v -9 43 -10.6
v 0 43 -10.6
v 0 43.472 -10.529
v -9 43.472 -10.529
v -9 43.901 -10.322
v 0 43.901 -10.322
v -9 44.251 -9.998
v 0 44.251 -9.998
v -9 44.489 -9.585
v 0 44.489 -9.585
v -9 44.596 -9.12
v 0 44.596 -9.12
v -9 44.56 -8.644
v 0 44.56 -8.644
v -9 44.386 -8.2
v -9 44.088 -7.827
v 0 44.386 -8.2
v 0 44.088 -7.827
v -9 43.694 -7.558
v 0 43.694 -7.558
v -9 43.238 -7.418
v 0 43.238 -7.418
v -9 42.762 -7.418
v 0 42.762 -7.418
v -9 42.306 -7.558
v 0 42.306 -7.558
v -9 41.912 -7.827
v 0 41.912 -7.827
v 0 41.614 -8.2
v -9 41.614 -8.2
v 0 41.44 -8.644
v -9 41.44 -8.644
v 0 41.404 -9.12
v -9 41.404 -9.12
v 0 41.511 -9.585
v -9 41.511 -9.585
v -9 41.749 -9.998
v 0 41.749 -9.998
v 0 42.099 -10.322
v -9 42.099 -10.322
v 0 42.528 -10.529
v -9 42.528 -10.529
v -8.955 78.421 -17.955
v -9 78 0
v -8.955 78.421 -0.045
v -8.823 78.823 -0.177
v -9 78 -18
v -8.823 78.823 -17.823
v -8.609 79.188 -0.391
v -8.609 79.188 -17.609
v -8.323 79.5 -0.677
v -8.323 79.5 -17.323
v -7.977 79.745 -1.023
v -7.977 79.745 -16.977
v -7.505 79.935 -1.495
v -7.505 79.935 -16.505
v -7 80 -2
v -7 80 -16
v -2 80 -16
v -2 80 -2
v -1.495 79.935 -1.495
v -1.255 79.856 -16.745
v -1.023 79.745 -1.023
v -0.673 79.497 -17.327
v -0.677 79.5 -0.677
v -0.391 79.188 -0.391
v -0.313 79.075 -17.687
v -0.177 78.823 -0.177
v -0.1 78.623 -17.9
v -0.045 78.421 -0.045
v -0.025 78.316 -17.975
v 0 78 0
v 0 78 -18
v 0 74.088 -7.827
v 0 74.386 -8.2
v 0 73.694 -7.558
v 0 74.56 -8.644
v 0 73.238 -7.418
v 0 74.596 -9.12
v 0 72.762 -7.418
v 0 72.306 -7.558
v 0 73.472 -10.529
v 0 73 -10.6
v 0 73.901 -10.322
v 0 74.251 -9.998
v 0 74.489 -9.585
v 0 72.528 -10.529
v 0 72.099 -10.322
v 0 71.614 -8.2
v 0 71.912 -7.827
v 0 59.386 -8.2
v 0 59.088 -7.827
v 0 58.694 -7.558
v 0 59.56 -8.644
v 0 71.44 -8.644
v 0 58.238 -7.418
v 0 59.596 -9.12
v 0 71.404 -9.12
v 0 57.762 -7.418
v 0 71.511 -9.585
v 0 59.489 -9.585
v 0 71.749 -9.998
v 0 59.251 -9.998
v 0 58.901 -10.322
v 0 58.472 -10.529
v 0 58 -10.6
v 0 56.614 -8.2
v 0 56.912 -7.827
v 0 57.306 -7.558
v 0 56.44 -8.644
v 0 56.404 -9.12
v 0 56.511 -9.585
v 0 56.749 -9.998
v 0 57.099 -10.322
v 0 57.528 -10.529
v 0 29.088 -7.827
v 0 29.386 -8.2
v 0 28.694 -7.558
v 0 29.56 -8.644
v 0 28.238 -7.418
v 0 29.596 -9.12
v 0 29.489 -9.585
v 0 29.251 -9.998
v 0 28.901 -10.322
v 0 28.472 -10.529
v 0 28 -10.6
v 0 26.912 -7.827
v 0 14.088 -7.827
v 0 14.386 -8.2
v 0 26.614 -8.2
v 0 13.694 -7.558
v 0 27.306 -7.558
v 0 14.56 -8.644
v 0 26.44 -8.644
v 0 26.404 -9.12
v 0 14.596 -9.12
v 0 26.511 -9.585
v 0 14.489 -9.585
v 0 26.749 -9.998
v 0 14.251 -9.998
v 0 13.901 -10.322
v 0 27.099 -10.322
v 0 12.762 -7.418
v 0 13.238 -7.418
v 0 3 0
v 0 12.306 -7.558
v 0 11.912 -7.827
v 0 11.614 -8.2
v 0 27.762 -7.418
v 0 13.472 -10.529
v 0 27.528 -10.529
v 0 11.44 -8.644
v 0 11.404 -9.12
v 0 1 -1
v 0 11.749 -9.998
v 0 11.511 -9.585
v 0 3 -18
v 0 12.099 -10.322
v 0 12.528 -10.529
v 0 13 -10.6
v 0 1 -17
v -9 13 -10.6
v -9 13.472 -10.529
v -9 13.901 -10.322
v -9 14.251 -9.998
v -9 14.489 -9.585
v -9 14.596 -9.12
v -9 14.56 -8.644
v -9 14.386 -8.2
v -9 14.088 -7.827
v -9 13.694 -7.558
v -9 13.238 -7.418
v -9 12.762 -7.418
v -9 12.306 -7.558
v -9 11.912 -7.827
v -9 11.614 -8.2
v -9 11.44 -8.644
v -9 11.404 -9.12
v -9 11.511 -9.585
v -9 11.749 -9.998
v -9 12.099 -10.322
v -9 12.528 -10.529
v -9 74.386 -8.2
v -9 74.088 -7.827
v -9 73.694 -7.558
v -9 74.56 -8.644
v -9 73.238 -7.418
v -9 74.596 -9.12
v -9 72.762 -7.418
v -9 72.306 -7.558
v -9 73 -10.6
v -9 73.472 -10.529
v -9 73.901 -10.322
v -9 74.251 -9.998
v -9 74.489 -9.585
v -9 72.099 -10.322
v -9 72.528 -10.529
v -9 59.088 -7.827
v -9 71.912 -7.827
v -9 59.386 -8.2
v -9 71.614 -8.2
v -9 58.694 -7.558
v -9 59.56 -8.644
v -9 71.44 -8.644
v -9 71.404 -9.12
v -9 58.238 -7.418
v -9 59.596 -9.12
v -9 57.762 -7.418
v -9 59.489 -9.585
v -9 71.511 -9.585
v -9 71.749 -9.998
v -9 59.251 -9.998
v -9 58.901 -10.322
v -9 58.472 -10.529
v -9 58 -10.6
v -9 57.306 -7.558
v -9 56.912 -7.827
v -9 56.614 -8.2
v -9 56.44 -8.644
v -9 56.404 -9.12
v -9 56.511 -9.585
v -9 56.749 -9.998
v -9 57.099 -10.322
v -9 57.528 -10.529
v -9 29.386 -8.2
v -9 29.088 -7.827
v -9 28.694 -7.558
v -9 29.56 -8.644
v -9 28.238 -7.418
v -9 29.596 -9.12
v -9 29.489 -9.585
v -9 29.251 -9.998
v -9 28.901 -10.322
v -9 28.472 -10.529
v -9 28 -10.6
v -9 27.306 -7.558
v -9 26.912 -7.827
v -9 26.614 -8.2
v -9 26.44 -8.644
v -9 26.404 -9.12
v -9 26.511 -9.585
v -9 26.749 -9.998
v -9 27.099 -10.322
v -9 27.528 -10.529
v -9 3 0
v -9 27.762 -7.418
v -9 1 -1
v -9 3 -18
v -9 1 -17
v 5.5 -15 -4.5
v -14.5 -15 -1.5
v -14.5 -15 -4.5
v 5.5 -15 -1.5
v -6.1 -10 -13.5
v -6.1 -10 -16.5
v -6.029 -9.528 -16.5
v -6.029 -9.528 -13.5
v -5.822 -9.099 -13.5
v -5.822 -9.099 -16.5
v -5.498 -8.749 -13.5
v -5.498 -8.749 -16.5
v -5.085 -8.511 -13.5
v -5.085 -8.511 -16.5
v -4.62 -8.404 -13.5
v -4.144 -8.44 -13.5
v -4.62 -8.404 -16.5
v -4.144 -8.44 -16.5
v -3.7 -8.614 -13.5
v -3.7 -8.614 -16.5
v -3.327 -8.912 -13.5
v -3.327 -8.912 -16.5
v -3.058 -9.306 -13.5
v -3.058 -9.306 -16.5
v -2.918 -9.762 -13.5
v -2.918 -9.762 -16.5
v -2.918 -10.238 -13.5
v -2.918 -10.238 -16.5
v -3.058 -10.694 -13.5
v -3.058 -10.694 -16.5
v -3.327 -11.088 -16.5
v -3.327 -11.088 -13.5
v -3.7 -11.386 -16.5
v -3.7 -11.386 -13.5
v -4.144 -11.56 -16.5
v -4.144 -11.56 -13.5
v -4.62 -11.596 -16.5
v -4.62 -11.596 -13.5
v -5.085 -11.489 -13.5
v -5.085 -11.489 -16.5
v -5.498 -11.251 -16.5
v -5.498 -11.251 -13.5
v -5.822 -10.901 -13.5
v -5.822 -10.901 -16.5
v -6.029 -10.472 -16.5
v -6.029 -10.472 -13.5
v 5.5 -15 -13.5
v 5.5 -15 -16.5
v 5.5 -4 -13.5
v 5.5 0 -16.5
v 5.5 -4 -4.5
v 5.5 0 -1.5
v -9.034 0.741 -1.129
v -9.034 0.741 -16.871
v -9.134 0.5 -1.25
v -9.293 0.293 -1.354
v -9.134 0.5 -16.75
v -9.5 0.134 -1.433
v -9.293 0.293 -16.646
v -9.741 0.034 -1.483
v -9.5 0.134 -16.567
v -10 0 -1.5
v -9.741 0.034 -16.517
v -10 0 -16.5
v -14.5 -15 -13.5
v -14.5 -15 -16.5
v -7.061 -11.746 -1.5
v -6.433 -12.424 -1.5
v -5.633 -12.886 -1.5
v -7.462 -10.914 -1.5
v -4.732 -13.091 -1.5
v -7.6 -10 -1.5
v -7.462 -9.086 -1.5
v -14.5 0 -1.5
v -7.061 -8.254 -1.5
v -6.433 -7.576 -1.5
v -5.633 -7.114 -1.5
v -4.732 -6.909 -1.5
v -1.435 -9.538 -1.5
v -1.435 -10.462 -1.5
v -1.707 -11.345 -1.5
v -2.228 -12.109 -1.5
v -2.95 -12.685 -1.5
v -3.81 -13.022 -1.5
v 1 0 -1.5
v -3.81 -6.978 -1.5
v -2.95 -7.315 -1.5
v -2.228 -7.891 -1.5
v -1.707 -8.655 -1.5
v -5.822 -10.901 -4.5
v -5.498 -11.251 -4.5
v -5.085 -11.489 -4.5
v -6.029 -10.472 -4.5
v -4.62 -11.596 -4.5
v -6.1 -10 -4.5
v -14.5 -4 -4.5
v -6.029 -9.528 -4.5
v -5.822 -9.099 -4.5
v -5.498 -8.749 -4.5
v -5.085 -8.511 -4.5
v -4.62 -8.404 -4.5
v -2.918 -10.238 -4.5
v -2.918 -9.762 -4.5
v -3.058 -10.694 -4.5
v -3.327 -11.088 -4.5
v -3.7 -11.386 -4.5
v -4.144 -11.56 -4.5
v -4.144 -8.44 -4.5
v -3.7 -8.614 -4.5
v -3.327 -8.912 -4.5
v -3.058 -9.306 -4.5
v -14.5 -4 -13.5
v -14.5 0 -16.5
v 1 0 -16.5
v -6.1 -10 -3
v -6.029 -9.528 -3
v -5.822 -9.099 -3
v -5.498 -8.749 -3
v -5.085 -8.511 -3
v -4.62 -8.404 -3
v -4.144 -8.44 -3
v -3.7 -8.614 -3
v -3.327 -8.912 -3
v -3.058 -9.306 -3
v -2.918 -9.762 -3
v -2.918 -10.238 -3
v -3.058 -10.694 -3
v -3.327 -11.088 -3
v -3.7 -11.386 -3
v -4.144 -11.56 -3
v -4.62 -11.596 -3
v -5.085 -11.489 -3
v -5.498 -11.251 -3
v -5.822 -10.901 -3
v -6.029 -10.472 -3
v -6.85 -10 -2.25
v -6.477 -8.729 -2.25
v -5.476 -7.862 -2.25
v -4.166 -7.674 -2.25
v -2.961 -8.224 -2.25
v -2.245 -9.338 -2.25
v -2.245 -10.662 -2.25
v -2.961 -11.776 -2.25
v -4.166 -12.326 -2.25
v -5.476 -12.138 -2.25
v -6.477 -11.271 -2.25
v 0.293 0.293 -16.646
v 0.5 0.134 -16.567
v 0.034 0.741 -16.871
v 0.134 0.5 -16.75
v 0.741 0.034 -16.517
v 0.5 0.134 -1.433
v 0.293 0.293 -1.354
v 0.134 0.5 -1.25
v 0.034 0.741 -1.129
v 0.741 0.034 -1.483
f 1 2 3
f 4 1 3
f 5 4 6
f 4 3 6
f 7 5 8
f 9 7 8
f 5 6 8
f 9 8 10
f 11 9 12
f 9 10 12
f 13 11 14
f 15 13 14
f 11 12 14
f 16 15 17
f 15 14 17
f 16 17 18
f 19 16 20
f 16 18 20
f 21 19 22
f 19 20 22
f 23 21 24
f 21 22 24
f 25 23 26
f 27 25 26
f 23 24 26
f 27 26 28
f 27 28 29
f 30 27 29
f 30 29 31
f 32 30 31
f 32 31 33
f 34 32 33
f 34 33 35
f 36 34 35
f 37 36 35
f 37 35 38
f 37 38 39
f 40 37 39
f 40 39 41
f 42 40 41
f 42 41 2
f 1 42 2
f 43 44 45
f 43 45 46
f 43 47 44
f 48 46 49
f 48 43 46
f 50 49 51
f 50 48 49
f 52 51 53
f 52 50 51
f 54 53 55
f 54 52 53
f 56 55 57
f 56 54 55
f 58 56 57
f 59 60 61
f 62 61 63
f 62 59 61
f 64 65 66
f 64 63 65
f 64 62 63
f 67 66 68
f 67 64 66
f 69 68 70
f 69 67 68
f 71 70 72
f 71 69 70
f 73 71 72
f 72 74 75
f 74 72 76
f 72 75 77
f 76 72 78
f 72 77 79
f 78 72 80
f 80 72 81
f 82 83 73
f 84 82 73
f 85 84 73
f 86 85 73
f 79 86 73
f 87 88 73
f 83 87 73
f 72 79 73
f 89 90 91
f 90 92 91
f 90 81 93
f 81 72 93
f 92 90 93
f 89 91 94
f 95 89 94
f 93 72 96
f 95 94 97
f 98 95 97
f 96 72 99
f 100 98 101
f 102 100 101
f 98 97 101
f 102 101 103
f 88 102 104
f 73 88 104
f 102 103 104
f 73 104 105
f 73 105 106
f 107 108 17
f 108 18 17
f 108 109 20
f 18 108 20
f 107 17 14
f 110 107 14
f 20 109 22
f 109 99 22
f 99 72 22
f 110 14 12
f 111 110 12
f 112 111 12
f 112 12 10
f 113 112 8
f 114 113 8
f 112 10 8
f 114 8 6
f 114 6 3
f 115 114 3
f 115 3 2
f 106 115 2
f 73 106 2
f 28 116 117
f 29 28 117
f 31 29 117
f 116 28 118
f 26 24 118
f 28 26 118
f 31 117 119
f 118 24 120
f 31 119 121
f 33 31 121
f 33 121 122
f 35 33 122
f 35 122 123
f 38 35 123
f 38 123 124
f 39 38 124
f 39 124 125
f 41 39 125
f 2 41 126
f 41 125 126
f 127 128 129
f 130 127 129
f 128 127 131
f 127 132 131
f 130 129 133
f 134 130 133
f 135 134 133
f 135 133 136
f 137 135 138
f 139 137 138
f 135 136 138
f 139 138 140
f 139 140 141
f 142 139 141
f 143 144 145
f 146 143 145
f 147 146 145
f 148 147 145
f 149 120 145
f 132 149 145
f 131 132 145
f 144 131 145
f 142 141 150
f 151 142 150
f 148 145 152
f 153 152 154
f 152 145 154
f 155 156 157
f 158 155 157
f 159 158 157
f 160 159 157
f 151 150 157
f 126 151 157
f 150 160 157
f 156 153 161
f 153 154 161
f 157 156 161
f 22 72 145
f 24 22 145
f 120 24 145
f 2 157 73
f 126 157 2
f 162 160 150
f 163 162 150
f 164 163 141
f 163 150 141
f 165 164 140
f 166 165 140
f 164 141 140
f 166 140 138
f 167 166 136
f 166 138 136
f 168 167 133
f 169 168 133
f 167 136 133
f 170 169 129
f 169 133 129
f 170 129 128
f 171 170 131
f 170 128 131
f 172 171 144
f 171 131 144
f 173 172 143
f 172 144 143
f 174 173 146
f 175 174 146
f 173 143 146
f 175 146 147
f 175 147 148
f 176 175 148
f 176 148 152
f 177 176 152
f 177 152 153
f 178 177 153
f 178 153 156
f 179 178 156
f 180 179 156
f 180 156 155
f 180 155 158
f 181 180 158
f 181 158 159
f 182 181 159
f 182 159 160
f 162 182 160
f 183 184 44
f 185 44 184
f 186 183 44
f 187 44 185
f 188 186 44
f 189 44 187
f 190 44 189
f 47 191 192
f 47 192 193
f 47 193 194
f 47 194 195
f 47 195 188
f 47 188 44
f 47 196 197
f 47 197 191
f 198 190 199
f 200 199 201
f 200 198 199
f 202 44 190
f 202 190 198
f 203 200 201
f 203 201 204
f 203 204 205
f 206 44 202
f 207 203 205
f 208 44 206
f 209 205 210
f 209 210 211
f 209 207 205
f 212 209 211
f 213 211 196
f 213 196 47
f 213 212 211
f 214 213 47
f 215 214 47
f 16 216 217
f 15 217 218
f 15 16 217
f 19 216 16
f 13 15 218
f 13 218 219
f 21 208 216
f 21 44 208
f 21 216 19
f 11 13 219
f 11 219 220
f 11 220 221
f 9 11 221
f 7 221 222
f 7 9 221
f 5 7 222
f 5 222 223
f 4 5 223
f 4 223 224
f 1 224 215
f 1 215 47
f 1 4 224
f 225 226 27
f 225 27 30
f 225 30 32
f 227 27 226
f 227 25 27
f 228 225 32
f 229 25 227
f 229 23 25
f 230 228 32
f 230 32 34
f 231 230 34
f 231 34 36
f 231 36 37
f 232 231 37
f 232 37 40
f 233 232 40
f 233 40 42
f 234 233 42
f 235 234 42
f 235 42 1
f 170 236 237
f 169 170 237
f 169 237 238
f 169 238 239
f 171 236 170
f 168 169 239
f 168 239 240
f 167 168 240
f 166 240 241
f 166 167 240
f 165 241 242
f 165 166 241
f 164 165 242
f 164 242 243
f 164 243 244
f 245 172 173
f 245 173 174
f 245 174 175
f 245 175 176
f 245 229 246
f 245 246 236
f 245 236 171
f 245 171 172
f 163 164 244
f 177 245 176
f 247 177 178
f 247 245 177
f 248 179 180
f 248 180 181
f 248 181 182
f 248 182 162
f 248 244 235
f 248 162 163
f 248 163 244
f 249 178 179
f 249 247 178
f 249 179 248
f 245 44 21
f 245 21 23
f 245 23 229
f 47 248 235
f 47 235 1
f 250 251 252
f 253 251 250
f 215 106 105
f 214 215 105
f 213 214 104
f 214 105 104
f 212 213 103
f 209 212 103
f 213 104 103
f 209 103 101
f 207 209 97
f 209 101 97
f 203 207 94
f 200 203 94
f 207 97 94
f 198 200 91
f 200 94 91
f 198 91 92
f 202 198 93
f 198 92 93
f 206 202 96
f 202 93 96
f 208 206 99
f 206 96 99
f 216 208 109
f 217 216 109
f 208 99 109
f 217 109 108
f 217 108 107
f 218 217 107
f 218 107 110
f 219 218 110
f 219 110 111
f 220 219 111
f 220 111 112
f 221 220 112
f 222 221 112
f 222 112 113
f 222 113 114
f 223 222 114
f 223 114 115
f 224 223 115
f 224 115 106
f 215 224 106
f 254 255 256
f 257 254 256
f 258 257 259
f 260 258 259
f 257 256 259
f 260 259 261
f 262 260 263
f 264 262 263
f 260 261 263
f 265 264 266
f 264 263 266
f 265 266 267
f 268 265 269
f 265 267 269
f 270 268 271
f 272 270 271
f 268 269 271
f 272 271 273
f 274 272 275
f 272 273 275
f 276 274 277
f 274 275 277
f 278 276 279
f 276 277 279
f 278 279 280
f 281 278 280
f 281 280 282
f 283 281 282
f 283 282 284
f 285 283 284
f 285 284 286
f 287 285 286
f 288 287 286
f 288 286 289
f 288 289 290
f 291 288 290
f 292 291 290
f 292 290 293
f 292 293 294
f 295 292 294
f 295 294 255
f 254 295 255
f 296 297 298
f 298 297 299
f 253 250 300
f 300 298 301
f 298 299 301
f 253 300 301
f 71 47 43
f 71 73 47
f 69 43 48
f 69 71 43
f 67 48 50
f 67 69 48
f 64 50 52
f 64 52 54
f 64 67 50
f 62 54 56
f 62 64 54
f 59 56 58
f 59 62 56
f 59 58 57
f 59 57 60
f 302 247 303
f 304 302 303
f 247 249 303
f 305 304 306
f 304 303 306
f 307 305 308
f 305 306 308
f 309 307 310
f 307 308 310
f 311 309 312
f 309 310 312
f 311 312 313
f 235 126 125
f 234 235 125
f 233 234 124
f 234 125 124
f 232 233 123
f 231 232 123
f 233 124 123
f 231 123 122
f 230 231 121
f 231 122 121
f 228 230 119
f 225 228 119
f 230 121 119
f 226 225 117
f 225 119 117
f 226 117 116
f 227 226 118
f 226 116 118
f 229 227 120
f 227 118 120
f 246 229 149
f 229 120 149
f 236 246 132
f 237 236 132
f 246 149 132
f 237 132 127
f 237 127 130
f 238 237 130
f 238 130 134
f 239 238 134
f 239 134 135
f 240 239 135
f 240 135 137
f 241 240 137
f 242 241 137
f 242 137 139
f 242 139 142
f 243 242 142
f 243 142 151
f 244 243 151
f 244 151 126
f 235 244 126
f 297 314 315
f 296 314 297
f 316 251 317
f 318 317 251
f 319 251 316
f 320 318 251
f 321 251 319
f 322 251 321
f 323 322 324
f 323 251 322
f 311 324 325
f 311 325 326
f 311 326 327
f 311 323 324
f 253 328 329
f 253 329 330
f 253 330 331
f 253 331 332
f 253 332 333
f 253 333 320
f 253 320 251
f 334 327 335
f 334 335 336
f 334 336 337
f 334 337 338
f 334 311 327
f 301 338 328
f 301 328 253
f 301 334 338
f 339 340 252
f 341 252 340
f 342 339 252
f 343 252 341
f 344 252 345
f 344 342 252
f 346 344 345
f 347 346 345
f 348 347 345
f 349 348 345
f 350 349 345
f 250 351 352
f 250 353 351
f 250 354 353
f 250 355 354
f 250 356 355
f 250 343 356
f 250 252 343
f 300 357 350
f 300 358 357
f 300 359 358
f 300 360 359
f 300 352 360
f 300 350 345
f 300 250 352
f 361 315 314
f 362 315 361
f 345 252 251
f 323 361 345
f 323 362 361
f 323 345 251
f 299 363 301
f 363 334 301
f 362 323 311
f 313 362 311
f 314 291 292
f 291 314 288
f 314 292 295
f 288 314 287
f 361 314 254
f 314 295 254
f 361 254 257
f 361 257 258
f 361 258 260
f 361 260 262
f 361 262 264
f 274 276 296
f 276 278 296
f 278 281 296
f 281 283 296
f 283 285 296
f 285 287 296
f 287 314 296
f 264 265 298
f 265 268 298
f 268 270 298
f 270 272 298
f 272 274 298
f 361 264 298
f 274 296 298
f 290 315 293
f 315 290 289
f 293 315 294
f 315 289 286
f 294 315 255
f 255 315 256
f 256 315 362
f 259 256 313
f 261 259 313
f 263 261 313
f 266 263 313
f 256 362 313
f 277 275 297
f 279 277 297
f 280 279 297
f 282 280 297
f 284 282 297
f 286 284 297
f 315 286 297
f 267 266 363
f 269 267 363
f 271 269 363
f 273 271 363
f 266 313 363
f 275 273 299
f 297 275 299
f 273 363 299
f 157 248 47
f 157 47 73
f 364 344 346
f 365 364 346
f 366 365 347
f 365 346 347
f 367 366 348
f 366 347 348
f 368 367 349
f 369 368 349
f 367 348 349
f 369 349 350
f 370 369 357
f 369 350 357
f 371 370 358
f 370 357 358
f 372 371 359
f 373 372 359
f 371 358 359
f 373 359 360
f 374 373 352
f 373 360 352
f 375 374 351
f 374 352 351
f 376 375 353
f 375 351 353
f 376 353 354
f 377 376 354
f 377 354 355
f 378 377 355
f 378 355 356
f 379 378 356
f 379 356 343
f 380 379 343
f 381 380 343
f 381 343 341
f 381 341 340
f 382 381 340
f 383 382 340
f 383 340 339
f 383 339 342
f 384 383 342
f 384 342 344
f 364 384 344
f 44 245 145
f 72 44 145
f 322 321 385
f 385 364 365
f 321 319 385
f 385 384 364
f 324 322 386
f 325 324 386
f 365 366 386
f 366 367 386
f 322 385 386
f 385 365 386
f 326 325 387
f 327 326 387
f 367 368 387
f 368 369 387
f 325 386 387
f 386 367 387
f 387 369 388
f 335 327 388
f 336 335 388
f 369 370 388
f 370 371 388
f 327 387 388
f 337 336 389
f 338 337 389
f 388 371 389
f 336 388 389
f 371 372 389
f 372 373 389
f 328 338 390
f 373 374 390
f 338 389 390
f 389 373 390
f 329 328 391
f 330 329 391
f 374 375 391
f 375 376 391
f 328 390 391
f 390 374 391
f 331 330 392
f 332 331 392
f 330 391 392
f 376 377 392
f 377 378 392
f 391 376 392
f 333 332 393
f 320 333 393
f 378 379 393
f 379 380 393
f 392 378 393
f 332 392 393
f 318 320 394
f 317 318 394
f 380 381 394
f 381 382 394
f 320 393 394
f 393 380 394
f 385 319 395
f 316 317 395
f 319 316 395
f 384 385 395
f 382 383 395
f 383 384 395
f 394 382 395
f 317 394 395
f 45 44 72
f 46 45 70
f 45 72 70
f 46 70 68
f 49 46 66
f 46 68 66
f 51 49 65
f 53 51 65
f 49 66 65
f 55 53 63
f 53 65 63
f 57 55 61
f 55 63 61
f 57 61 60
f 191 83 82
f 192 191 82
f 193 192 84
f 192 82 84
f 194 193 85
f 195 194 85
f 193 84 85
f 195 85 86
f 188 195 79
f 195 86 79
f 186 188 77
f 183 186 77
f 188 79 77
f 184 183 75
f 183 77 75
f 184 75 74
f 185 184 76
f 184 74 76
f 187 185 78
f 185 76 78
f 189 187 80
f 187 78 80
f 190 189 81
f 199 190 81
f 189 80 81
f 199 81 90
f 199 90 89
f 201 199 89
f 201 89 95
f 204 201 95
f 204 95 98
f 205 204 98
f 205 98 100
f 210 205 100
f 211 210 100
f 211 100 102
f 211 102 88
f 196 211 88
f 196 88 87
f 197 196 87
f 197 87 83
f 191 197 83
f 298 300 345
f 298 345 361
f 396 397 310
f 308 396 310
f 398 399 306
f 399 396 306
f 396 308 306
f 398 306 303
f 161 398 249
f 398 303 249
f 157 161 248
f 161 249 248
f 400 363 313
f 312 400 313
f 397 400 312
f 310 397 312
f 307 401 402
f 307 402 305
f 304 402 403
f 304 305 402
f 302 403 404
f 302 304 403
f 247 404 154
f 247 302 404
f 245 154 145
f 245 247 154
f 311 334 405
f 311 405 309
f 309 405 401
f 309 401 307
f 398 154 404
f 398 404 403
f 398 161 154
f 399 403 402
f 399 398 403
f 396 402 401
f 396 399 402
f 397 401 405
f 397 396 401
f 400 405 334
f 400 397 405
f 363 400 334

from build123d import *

# Parameters (mm, degrees)
SKETCH1_W           = 9
SKETCH1_H           = 18
BOSS_EXTRUDE1_DEPTH = 80
SKETCH2_W           = 20
SKETCH2_H           = 15
BOSS_EXTRUDE2_DEPTH = 15
SKETCH4_W           = 9
SKETCH4_H           = 11
CUT_EXTRUDE2_DEPTH  = 20
SKETCH5_R           = 1.6
CUT_EXTRUDE3_DEPTH  = 20
FILLET3_R           = 2
SKETCH6_R           = 1.6
CUT_EXTRUDE4_DEPTH  = 10
CUT_EXTRUDE5_DEPTH  = 10
FILLET8_R           = 1
CHAMFER1_SIZE       = 1.5


with BuildPart() as part:
    # Sketch1 → Boss-Extrude1 (new body)
    with BuildSketch(Plane(origin=(0, 0, 0), x_dir=(1, 0, 0), z_dir=(0, 1, 0))):
        with Locations((-4.5, 9)):
            Rectangle(SKETCH1_W, SKETCH1_H)
    extrude(amount=BOSS_EXTRUDE1_DEPTH)

    # Sketch2 → Boss-Extrude2 (add)
    with BuildSketch(Plane.XZ):
        with Locations((-4.5, -9)):
            Rectangle(SKETCH2_W, SKETCH2_H)
    extrude(amount=BOSS_EXTRUDE2_DEPTH)

    # Sketch4 → Cut-Extrude2 (cut)
    with BuildSketch(Plane(origin=(5.5, 0, 0), x_dir=(0, 0, -1), z_dir=(1, 0, 0))):
        with Locations((9, -9.5)):
            Rectangle(SKETCH4_W, SKETCH4_H)
    extrude(amount=-CUT_EXTRUDE2_DEPTH, mode=Mode.SUBTRACT)

    # Sketch5 → Cut-Extrude3 (cut)
    with BuildSketch(Plane(origin=(0, 0, -16.5), x_dir=(-1, 0, 0), z_dir=(0, 0, -1))):
        with Locations((4.5, -10)):
            Circle(SKETCH5_R)
    extrude(amount=-CUT_EXTRUDE3_DEPTH, mode=Mode.SUBTRACT)

    # Fillet3
    fillet3_edges = [part.edges().sort_by_distance(p)[0] for p in [
        (-9, 80, -9),
        (-4.5, 80, 0),
        (0, 80, -9),
        (-4.5, 80, -18),
    ]]
    fillet(fillet3_edges, radius=FILLET3_R)

    # Sketch6 → Cut-Extrude4 (cut)
    with BuildSketch(Plane(origin=(0, 0, 0), x_dir=(0, 0, -1), z_dir=(1, 0, 0))):
        with Locations((9, 73)):
            Circle(SKETCH6_R)
        with Locations((9, 58)):
            Circle(SKETCH6_R)
        with Locations((9, 43)):
            Circle(SKETCH6_R)
        with Locations((9, 28)):
            Circle(SKETCH6_R)
        with Locations((9, 13)):
            Circle(SKETCH6_R)
    extrude(amount=-CUT_EXTRUDE4_DEPTH, mode=Mode.SUBTRACT)

    # Sketch7 → Cut-Extrude5 (cut)
    with BuildSketch(Plane.ZY.offset(9)):
        Polygon((-16.5, 0), (-18, 3), (-18, 0), align=None)
        Polygon((-1.5, 0), (0, 3), (0, 0), align=None)
    extrude(amount=-CUT_EXTRUDE5_DEPTH, mode=Mode.SUBTRACT)

    # Fillet8
    fillet8_edges = [part.edges().sort_by_distance(p)[0] for p in [
        (0, 0, -9),
        (-9, 0, -9),
    ]]
    fillet(fillet8_edges, radius=FILLET8_R)

    # Chamfer1
    chamfer1_edges = [part.edges().sort_by_distance(p)[0] for p in [
        (-2.9, -10, -1.5),
    ]]
    chamfer(chamfer1_edges, length=CHAMFER1_SIZE)


solid = part.part
